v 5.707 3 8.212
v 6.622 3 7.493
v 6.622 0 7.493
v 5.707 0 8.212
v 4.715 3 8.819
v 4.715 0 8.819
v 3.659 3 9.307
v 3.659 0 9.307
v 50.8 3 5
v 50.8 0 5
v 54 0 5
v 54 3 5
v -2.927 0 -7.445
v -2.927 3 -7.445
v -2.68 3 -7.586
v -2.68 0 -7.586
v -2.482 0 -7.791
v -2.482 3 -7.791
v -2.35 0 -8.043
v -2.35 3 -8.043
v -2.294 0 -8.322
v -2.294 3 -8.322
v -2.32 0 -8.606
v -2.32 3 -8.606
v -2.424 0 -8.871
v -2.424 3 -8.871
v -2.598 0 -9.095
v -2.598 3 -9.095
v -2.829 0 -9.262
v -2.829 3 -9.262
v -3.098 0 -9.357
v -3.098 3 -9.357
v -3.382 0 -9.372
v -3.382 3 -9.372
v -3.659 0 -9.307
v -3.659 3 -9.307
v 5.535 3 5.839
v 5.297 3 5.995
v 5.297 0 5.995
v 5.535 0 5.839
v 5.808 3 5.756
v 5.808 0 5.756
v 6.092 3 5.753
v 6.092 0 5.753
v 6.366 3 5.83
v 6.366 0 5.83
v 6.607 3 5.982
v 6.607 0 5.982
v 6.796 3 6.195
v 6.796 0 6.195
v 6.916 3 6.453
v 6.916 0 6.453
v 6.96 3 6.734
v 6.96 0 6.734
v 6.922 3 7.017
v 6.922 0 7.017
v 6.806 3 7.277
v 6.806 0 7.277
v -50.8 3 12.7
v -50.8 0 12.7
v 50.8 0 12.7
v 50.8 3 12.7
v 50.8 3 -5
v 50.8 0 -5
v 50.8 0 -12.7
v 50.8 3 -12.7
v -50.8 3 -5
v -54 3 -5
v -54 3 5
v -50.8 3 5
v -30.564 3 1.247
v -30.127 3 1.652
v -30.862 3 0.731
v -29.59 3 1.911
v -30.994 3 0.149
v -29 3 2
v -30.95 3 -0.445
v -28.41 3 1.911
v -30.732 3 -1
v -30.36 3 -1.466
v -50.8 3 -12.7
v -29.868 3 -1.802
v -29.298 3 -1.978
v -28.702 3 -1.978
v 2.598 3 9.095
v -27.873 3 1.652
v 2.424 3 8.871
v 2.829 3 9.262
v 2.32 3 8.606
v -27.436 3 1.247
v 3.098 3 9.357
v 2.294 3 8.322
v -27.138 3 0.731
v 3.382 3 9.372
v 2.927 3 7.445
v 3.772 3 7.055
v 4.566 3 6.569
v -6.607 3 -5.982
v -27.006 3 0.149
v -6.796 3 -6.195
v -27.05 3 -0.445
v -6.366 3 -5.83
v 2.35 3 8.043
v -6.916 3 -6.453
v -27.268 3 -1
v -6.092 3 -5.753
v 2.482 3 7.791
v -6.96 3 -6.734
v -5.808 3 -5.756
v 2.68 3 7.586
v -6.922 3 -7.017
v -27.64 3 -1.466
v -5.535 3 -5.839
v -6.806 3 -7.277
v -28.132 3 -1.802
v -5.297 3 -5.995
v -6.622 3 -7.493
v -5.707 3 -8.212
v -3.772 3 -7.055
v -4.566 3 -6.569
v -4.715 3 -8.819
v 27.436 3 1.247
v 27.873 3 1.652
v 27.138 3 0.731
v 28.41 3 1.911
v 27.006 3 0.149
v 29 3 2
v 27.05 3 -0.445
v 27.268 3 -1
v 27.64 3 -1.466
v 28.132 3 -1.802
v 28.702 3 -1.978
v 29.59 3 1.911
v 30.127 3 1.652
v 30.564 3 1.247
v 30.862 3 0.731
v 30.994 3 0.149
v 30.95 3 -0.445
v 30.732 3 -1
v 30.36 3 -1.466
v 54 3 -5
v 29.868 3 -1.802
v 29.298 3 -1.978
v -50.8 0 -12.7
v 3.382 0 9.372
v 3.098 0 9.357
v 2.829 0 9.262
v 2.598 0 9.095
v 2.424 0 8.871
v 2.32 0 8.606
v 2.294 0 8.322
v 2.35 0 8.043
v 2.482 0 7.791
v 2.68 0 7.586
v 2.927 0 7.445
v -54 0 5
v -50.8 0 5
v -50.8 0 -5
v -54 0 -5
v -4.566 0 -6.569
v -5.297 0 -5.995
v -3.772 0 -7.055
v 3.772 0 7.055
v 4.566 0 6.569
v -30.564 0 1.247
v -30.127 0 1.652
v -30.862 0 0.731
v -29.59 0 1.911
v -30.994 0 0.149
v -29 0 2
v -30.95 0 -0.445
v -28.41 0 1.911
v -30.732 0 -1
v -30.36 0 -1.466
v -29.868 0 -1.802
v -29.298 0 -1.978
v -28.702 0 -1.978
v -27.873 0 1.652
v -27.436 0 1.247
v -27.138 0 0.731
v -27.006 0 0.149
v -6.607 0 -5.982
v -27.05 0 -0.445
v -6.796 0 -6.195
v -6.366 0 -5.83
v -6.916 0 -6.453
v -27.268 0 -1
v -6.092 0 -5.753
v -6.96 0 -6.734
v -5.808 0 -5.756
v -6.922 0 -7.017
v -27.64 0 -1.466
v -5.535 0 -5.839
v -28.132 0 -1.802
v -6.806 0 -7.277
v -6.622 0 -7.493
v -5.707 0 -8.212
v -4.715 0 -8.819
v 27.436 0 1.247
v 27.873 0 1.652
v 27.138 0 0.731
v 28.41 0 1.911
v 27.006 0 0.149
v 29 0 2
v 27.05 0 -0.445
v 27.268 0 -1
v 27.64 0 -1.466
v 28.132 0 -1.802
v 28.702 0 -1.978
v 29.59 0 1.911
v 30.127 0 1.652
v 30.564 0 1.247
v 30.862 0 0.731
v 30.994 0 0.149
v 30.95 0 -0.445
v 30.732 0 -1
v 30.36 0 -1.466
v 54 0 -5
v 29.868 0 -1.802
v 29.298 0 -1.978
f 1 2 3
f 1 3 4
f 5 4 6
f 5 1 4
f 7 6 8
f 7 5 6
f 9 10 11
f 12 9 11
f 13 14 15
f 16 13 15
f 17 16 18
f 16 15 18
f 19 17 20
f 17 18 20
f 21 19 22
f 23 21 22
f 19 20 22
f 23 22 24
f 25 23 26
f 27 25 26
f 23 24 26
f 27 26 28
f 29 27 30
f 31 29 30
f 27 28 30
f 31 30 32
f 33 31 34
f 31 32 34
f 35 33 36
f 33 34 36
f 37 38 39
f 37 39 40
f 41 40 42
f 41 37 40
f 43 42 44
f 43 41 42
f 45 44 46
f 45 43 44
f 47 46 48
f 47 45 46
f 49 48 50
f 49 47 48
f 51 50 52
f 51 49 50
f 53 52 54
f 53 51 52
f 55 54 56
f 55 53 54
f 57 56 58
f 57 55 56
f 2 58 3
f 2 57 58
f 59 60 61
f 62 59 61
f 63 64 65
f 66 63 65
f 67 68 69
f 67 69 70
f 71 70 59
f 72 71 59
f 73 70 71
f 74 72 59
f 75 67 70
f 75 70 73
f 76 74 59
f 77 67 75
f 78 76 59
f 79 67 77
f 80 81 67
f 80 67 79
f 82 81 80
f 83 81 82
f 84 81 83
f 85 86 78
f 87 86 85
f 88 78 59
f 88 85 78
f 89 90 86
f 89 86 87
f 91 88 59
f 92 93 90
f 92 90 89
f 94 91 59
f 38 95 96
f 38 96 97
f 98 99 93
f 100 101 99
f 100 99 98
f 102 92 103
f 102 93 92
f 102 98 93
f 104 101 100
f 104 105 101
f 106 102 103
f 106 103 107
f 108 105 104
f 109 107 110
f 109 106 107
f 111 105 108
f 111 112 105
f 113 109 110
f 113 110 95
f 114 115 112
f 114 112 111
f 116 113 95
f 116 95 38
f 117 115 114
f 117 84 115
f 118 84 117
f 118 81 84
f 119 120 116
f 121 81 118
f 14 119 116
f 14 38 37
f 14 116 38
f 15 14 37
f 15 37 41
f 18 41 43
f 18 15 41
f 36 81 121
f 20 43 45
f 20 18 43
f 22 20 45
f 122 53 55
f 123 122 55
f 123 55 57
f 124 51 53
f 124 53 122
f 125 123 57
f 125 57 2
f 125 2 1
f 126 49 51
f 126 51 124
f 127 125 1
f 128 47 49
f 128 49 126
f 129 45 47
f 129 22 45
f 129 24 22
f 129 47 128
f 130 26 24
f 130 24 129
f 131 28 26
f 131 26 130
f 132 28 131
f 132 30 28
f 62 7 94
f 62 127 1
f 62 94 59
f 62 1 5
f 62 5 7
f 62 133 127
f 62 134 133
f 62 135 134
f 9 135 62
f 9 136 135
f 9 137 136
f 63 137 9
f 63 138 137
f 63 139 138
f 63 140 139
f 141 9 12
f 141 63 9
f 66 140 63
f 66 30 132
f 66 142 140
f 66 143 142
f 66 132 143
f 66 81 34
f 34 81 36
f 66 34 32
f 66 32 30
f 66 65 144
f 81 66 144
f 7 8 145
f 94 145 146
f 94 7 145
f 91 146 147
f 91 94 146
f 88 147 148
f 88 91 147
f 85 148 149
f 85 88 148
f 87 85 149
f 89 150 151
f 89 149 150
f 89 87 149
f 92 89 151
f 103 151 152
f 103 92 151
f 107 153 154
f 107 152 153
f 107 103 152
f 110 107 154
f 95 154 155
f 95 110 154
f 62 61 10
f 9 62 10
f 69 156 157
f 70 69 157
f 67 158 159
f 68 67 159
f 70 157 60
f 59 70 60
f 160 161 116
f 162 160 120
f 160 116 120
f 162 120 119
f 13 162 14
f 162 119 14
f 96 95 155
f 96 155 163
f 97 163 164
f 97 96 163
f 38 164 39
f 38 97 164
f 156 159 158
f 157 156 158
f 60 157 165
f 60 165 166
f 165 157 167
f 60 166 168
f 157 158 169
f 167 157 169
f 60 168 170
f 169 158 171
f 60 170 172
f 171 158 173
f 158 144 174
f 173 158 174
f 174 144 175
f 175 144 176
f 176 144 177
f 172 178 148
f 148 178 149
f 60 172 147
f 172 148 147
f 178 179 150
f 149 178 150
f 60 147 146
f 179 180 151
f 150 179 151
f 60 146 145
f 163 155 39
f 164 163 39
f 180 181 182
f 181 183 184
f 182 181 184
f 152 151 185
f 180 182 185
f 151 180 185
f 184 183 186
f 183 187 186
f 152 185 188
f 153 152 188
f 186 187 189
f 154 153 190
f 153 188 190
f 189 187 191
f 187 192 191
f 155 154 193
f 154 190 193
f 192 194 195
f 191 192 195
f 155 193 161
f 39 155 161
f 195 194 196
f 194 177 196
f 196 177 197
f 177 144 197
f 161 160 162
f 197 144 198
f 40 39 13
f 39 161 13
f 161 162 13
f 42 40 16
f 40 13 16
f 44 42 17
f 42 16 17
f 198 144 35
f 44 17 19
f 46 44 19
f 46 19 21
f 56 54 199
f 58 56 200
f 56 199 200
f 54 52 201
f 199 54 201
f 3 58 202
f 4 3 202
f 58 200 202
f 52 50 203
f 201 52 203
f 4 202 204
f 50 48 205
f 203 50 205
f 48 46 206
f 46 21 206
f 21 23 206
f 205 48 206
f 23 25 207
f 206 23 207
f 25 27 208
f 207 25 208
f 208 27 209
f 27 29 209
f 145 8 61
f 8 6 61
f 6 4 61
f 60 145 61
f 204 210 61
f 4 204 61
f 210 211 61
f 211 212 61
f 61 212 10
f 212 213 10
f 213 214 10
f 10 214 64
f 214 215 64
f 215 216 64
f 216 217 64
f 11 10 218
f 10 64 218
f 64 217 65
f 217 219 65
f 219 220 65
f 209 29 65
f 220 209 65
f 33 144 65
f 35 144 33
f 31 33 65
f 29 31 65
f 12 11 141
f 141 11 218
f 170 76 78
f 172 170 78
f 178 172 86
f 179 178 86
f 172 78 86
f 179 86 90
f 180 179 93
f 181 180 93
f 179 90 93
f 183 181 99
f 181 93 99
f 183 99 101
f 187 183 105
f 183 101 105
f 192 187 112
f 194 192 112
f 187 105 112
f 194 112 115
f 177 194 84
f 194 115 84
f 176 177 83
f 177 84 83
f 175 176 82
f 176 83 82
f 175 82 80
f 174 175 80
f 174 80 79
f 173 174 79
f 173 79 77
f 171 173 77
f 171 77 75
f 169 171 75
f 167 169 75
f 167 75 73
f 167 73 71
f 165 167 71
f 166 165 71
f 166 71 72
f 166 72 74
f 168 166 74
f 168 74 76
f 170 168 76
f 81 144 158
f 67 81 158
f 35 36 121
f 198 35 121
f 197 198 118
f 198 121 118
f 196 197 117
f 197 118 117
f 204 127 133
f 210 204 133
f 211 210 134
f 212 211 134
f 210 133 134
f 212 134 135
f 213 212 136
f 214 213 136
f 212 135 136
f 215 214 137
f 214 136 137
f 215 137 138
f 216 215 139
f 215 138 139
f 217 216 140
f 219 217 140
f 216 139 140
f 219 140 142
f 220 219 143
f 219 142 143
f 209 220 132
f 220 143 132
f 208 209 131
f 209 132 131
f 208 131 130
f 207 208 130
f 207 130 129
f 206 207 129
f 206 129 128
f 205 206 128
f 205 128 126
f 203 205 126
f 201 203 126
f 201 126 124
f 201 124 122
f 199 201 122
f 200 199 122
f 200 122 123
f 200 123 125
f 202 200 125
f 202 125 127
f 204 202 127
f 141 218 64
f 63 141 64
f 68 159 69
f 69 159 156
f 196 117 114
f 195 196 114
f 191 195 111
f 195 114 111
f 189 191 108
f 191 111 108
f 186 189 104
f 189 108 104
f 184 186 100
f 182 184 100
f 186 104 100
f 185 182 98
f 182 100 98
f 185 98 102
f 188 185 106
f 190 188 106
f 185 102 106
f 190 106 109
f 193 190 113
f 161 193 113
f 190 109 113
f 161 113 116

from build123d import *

# Parameters (mm, degrees)
BOSS_EXTRUDE1_DEPTH = 3
CUT_EXTRUDE1_DEPTH  = 56.554387766
SKETCH3_R           = 2
CUT_EXTRUDE2_DEPTH  = 56.554387766


with BuildPart() as part:
    # Sketch1 → Boss-Extrude1 (new body)
    with BuildSketch(Plane(origin=(0, 0, 0), x_dir=(1, 0, 0), z_dir=(0, 1, 0))):
        Polygon((-50.8, -5), (-50.8, -12.7), (50.8, -12.7), (50.8, -5), (54, -5), (54, 5), (50.8, 5), (50.8, 12.7), (-50.8, 12.7), (-50.8, 5), (-54, 5), (-54, -5), align=None)
    extrude(amount=BOSS_EXTRUDE1_DEPTH)

    # Sketch2 → Cut-Extrude1 (cut, through all)
    with BuildSketch(Plane(origin=(0, 3, 0), x_dir=(1, 0, 0), z_dir=(0, 1, 0))):
        with BuildLine():
            ThreePointArc((2.927112115, -7.445267938), (4.175733356, -6.823727057), (5.297427434, -5.994769602))
            ThreePointArc((5.297427434, -5.994769602), (6.708952064, -6.081937373), (6.621784293, -7.493462002))
            ThreePointArc((6.621784293, -7.493462002), (5.219666694, -8.529658821), (3.658890144, -9.306584922))
            ThreePointArc((3.658890144, -9.306584922), (2.362342638, -8.741815444), (2.927112115, -7.445267938))
        make_face()
        with BuildLine():
            ThreePointArc((-3.658890144, 9.306584922), (-5.219666694, 8.529658821), (-6.621784293, 7.493462002))
            ThreePointArc((-6.621784293, 7.493462002), (-6.708952064, 6.081937373), (-5.297427434, 5.994769602))
            ThreePointArc((-5.297427434, 5.994769602), (-4.175733356, 6.823727057), (-2.927112115, 7.445267938))
            ThreePointArc((-2.927112115, 7.445267938), (-2.362342638, 8.741815444), (-3.658890144, 9.306584922))
        make_face()
    extrude(amount=-CUT_EXTRUDE1_DEPTH, mode=Mode.SUBTRACT)

    # Sketch3 → Cut-Extrude2 (cut, through all)
    with BuildSketch(Plane(origin=(0, 3, 0), x_dir=(1, 0, 0), z_dir=(0, 1, 0))):
        with Locations(Location((29, 0, 0), (0, 0, 270))):
            Circle(SKETCH3_R)
        with Locations(Location((-29, 0, 0), (0, 0, 270))):
            Circle(SKETCH3_R)
    extrude(amount=-CUT_EXTRUDE2_DEPTH, mode=Mode.SUBTRACT)


solid = part.part
